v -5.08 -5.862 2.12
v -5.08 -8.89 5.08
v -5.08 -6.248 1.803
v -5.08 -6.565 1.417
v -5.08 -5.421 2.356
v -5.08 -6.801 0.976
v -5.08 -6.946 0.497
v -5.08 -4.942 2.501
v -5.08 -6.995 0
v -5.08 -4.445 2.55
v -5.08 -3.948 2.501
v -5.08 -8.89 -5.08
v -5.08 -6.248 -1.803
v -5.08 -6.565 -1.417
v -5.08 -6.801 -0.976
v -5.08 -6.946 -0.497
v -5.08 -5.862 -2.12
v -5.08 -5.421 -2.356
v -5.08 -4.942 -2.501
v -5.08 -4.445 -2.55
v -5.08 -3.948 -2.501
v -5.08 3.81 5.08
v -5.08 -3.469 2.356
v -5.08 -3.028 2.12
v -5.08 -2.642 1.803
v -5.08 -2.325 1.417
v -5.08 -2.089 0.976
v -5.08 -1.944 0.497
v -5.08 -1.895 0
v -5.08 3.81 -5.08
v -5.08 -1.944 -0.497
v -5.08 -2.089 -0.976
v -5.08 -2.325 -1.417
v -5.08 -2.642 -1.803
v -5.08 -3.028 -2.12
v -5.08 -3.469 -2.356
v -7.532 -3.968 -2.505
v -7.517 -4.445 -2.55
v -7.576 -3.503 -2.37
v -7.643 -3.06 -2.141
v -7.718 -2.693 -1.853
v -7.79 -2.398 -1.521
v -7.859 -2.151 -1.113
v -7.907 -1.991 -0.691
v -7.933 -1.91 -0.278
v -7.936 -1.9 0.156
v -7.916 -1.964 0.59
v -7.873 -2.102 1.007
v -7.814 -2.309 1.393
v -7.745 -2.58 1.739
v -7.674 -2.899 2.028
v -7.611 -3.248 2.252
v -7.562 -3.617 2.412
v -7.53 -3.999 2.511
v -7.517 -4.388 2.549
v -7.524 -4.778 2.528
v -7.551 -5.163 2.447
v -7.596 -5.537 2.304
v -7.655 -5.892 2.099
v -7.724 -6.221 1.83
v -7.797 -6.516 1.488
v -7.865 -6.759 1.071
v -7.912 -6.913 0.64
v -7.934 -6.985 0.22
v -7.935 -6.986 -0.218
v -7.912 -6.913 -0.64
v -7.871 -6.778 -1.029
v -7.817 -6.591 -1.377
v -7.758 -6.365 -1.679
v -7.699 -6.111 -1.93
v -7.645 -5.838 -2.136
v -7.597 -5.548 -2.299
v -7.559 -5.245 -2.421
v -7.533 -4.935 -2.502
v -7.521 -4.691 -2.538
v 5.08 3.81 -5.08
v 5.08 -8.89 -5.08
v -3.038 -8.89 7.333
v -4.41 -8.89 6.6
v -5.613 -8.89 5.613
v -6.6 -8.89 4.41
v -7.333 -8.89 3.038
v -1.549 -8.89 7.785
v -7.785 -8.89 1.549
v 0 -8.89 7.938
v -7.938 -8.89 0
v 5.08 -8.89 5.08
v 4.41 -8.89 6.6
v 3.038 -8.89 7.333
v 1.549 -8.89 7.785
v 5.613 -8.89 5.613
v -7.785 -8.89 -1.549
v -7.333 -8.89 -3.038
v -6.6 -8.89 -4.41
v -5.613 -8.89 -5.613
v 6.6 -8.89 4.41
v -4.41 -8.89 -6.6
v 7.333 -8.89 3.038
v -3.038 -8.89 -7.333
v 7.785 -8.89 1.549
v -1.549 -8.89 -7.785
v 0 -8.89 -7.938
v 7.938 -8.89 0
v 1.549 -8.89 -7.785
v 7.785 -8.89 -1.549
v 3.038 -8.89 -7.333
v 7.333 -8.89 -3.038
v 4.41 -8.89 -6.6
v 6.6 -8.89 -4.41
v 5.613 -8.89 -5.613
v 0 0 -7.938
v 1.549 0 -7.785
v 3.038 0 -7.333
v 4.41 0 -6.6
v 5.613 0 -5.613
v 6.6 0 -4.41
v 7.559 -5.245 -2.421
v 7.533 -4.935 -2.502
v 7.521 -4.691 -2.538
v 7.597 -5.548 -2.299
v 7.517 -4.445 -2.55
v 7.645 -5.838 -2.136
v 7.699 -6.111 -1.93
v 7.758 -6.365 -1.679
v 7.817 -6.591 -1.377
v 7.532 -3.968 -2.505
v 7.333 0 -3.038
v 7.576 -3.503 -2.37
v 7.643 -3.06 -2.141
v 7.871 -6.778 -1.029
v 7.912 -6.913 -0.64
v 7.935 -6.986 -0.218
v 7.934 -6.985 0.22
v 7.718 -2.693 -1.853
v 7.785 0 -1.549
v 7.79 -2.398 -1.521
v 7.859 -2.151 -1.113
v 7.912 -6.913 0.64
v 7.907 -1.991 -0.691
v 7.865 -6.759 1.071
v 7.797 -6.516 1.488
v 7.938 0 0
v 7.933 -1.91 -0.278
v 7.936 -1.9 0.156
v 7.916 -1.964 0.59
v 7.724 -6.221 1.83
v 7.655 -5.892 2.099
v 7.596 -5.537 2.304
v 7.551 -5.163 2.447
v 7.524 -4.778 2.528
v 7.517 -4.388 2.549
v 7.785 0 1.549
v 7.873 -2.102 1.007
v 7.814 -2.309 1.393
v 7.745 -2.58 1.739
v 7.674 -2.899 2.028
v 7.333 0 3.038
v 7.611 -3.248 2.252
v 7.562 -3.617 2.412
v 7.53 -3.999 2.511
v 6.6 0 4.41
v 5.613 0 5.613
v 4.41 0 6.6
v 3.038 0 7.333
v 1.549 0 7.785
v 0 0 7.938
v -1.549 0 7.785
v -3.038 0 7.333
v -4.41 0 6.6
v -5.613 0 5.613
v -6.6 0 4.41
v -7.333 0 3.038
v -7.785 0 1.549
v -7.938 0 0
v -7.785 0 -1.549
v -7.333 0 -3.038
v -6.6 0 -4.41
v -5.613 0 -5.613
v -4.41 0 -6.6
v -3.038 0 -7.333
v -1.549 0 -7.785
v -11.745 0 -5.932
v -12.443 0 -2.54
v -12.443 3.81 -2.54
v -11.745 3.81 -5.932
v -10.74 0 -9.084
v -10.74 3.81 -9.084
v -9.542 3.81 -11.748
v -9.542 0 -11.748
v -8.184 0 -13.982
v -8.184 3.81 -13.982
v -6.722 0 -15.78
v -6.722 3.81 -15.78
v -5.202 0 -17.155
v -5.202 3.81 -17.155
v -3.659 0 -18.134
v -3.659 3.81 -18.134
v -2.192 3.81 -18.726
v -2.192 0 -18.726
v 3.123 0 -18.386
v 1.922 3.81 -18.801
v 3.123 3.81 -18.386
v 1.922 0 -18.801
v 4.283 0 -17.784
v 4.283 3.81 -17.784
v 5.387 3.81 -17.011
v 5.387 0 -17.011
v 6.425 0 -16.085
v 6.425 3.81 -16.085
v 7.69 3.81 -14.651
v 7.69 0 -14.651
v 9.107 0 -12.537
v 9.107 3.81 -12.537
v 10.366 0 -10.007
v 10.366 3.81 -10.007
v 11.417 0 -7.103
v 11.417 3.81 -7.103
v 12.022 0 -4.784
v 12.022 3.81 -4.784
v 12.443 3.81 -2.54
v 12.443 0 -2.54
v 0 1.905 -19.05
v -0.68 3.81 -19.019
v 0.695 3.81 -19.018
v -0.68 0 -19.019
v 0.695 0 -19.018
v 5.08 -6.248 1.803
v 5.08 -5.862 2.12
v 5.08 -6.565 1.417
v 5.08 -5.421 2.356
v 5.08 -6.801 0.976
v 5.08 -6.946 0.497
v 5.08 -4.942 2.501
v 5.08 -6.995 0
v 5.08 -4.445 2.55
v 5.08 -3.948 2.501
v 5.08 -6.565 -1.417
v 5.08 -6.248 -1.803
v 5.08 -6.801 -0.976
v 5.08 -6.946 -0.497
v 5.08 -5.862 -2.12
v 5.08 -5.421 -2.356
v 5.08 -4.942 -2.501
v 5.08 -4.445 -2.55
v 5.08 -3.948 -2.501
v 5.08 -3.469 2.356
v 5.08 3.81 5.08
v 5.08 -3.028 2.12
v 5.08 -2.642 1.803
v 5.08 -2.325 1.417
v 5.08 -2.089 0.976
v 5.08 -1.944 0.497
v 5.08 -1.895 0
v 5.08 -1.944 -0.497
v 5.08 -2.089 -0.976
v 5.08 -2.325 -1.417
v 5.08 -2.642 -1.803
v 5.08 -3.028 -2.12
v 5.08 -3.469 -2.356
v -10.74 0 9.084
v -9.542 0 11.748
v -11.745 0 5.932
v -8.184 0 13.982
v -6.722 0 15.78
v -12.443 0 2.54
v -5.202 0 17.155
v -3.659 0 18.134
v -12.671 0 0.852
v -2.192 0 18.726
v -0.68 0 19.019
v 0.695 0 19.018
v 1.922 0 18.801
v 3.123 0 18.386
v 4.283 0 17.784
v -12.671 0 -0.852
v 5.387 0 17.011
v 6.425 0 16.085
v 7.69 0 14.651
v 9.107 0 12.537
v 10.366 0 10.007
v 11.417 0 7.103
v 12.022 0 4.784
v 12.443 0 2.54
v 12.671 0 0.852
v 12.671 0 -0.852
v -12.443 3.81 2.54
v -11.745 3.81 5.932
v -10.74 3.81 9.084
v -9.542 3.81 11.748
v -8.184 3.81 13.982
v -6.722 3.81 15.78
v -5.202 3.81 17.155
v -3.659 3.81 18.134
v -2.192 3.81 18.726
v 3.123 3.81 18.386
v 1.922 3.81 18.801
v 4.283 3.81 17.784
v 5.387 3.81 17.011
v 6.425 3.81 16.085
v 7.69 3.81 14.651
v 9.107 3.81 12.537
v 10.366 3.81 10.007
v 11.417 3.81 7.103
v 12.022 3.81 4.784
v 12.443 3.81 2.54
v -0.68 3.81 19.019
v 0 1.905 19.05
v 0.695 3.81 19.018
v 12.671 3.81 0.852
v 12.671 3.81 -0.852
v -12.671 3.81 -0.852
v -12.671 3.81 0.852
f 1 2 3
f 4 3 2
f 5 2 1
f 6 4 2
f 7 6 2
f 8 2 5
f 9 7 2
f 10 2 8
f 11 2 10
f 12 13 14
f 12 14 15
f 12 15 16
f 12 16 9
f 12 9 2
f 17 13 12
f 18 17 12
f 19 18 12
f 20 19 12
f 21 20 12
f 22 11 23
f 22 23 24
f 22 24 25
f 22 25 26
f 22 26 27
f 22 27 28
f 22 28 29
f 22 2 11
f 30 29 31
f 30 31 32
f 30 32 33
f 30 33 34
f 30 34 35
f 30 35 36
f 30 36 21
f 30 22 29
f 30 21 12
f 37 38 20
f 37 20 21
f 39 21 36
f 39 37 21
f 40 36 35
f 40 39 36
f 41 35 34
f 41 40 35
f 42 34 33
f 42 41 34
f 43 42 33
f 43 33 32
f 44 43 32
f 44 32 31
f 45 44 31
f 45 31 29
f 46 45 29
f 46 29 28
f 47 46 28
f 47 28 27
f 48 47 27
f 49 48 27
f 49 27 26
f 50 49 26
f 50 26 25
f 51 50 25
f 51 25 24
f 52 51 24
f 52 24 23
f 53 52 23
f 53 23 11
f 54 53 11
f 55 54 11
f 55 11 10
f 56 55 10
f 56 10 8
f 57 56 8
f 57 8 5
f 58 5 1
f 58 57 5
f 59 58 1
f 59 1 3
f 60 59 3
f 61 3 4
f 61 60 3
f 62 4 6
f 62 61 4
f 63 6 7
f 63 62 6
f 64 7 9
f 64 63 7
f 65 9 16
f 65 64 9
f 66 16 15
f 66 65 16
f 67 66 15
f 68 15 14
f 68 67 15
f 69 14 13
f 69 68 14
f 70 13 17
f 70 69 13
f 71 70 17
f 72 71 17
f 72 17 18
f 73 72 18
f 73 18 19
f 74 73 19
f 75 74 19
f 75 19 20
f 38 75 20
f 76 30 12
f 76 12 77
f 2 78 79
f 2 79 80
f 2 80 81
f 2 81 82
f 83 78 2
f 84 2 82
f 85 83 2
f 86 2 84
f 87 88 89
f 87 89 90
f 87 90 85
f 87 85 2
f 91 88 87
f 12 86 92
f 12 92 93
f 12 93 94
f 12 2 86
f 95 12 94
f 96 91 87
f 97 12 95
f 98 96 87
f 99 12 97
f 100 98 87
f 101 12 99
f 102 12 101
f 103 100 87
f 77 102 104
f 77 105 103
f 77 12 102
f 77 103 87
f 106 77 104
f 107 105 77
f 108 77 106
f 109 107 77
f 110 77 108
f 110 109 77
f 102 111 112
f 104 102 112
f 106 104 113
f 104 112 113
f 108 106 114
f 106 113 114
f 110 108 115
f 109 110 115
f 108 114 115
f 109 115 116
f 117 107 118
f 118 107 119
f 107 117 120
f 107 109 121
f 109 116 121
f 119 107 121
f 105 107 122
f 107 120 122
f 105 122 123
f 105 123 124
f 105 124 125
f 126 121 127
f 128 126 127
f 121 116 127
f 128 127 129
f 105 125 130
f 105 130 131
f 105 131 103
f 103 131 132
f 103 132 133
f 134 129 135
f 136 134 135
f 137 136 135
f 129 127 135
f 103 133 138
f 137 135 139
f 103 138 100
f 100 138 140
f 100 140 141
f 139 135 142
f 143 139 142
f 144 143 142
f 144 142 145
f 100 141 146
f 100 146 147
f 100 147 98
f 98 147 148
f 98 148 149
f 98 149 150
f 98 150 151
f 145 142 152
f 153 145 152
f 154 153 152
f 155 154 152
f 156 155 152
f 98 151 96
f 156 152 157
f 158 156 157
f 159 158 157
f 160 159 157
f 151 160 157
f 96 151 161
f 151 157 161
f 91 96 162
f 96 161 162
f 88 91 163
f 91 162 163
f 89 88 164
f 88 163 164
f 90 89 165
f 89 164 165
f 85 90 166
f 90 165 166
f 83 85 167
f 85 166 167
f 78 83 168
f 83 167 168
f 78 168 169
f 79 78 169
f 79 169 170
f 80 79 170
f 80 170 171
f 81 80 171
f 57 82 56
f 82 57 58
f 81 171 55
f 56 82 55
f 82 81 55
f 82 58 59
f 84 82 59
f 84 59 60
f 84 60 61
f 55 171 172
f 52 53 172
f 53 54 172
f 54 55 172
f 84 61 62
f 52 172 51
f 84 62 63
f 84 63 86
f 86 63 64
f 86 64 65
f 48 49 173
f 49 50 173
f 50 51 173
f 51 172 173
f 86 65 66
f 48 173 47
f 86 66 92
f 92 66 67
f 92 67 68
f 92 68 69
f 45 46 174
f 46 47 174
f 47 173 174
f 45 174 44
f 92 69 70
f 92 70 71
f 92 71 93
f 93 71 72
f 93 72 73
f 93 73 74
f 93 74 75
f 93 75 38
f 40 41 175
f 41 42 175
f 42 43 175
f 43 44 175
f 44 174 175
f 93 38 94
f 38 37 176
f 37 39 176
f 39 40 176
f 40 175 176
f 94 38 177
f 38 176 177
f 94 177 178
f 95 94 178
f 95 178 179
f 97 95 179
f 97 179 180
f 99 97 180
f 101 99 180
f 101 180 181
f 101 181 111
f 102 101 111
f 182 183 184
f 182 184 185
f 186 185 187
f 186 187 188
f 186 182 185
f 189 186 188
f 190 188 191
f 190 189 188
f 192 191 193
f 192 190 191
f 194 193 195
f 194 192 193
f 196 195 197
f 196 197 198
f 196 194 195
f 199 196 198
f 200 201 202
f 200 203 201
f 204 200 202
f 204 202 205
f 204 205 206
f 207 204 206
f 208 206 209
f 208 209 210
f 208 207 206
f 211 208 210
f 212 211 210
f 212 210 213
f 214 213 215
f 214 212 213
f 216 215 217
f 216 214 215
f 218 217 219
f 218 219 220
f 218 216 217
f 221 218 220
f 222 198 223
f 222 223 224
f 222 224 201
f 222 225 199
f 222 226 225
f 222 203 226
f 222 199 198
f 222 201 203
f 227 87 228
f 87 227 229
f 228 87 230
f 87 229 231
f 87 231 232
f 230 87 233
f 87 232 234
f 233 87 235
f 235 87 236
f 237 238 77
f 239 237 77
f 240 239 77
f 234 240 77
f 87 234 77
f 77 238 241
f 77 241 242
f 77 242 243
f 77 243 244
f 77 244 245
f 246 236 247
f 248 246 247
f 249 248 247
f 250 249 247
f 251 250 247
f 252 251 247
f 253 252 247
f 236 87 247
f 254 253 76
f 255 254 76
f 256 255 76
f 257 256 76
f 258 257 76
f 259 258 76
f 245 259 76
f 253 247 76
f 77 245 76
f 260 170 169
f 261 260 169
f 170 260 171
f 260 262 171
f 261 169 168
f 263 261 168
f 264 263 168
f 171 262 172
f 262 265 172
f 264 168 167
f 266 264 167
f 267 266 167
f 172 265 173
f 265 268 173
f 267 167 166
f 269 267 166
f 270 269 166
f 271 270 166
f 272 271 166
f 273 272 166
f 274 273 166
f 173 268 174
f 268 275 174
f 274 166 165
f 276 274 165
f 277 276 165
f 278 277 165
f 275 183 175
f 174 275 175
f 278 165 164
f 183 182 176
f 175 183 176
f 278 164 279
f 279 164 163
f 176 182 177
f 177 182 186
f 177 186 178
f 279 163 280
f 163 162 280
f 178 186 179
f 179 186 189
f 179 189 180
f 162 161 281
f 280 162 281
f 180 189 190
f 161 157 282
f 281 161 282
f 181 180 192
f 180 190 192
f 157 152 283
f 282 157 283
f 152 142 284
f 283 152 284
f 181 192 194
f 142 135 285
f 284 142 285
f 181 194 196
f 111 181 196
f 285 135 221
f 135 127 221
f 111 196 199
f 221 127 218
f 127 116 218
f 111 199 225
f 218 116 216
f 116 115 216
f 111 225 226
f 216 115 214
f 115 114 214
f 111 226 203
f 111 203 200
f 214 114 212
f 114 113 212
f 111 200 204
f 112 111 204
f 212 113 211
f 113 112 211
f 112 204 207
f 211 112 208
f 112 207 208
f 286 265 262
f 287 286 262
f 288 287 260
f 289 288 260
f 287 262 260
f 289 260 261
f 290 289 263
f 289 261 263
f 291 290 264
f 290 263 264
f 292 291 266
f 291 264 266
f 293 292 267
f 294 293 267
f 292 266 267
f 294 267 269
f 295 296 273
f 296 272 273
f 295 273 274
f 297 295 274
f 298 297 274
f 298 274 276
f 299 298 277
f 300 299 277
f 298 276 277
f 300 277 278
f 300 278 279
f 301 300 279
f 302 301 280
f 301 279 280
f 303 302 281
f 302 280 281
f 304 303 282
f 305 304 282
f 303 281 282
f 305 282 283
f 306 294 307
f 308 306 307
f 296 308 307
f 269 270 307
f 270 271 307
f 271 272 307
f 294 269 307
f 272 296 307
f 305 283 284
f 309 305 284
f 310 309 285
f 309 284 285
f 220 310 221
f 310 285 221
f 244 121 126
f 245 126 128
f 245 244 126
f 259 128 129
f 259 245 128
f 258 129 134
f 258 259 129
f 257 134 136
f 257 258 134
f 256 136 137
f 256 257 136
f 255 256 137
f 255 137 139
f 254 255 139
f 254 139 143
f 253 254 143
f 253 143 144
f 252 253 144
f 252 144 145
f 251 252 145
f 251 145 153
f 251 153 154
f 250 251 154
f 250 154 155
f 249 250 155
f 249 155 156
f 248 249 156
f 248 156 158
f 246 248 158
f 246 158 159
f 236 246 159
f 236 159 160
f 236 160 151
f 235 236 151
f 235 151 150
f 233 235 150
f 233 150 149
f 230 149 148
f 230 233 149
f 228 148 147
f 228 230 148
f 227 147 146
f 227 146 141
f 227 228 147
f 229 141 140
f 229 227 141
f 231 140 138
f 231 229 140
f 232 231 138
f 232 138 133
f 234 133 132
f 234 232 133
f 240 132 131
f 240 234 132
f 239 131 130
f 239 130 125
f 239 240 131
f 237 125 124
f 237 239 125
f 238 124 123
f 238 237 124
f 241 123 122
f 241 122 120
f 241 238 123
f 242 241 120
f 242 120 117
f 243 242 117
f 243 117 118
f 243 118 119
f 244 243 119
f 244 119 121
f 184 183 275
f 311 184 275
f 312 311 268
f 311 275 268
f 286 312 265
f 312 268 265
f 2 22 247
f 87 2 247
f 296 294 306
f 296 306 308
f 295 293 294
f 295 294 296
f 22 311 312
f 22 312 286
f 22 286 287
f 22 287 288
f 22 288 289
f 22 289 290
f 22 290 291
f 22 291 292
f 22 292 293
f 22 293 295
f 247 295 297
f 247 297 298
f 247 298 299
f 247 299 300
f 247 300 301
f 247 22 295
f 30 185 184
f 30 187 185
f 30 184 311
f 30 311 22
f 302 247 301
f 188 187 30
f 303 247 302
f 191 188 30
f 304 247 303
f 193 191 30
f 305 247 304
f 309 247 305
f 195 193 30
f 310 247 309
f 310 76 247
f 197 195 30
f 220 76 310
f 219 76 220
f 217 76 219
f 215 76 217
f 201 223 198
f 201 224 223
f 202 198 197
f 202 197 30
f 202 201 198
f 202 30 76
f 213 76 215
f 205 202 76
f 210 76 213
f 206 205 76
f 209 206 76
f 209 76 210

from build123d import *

# Parameters (mm, degrees)
BOSS_EXTRUDE1_DEPTH     = 3.81
SKETCH3_R               = 7.9375
BOSS_EXTRUDE2_DEPTH     = 8.89
SKETCH2_W               = 10.16
SKETCH2_H               = 10.16
CUT_EXTRUDE1_DEPTH      = 27.181720844
CUT_EXTRUDE2_DEPTH      = 30.459141437
CUT_EXTRUDE2_DEPTH_BACK = 30.459141437
SKETCH4_R               = 2.55


# Read off the part's stored shape, not the designer's step: Boss-Extrude1
with BuildPart() as part:
    # Boss-Extrude1 outline → Boss-Extrude1 (new body)
    with BuildSketch(Plane(origin=(0, 0, 0), x_dir=(1, 0, 0), z_dir=(0, 1, 0))):
        with BuildLine():
            ThreePointArc((12.443407893, -2.54), (12.7, 0), (12.443407893, 2.54))
            add(Edge.make_bspline(
                [(-12.443407893, 2.54), (0, 83.206957613), (12.443407893, 2.54)],
                knots=[0, 0, 0, 1, 1, 1], degree=2, weights=[1, 0.257337639, 1]))
            ThreePointArc((-12.443407893, 2.54), (-12.7, 0), (-12.443407893, -2.54))
            add(Edge.make_bspline(
                [(-12.443407893, -2.54), (0, -83.206957613), (12.443407893, -2.54)],
                knots=[0, 0, 0, 1, 1, 1], degree=2, weights=[1, 0.257337639, 1]))
        make_face()
    extrude(amount=BOSS_EXTRUDE1_DEPTH)

    # Sketch3 → Boss-Extrude2 (add)
    with BuildSketch(Plane.XZ):
        with Locations(Location((0, 0, 0), (0, 0, 270))):
            Circle(SKETCH3_R)
    extrude(amount=BOSS_EXTRUDE2_DEPTH)

    # Sketch2 → Cut-Extrude1 (cut, through all)
    with BuildSketch(Plane(origin=(0, 3.81, 0), x_dir=(1, 0, 0), z_dir=(0, 1, 0))):
        Rectangle(SKETCH2_W, SKETCH2_H)
    extrude(amount=-CUT_EXTRUDE1_DEPTH, mode=Mode.SUBTRACT)

    # Sketch4 → Cut-Extrude2 (cut, two sides: drawn at the far end of the back side and taken through both)
    with BuildSketch(Plane(origin=(7.9375, 0, 0), x_dir=(0, 0, -1), z_dir=(1, 0, 0)).offset(-CUT_EXTRUDE2_DEPTH_BACK)):
        with Locations((0, -4.445)):
            Circle(SKETCH4_R)
    extrude(amount=CUT_EXTRUDE2_DEPTH + CUT_EXTRUDE2_DEPTH_BACK, mode=Mode.SUBTRACT)


solid = part.part
